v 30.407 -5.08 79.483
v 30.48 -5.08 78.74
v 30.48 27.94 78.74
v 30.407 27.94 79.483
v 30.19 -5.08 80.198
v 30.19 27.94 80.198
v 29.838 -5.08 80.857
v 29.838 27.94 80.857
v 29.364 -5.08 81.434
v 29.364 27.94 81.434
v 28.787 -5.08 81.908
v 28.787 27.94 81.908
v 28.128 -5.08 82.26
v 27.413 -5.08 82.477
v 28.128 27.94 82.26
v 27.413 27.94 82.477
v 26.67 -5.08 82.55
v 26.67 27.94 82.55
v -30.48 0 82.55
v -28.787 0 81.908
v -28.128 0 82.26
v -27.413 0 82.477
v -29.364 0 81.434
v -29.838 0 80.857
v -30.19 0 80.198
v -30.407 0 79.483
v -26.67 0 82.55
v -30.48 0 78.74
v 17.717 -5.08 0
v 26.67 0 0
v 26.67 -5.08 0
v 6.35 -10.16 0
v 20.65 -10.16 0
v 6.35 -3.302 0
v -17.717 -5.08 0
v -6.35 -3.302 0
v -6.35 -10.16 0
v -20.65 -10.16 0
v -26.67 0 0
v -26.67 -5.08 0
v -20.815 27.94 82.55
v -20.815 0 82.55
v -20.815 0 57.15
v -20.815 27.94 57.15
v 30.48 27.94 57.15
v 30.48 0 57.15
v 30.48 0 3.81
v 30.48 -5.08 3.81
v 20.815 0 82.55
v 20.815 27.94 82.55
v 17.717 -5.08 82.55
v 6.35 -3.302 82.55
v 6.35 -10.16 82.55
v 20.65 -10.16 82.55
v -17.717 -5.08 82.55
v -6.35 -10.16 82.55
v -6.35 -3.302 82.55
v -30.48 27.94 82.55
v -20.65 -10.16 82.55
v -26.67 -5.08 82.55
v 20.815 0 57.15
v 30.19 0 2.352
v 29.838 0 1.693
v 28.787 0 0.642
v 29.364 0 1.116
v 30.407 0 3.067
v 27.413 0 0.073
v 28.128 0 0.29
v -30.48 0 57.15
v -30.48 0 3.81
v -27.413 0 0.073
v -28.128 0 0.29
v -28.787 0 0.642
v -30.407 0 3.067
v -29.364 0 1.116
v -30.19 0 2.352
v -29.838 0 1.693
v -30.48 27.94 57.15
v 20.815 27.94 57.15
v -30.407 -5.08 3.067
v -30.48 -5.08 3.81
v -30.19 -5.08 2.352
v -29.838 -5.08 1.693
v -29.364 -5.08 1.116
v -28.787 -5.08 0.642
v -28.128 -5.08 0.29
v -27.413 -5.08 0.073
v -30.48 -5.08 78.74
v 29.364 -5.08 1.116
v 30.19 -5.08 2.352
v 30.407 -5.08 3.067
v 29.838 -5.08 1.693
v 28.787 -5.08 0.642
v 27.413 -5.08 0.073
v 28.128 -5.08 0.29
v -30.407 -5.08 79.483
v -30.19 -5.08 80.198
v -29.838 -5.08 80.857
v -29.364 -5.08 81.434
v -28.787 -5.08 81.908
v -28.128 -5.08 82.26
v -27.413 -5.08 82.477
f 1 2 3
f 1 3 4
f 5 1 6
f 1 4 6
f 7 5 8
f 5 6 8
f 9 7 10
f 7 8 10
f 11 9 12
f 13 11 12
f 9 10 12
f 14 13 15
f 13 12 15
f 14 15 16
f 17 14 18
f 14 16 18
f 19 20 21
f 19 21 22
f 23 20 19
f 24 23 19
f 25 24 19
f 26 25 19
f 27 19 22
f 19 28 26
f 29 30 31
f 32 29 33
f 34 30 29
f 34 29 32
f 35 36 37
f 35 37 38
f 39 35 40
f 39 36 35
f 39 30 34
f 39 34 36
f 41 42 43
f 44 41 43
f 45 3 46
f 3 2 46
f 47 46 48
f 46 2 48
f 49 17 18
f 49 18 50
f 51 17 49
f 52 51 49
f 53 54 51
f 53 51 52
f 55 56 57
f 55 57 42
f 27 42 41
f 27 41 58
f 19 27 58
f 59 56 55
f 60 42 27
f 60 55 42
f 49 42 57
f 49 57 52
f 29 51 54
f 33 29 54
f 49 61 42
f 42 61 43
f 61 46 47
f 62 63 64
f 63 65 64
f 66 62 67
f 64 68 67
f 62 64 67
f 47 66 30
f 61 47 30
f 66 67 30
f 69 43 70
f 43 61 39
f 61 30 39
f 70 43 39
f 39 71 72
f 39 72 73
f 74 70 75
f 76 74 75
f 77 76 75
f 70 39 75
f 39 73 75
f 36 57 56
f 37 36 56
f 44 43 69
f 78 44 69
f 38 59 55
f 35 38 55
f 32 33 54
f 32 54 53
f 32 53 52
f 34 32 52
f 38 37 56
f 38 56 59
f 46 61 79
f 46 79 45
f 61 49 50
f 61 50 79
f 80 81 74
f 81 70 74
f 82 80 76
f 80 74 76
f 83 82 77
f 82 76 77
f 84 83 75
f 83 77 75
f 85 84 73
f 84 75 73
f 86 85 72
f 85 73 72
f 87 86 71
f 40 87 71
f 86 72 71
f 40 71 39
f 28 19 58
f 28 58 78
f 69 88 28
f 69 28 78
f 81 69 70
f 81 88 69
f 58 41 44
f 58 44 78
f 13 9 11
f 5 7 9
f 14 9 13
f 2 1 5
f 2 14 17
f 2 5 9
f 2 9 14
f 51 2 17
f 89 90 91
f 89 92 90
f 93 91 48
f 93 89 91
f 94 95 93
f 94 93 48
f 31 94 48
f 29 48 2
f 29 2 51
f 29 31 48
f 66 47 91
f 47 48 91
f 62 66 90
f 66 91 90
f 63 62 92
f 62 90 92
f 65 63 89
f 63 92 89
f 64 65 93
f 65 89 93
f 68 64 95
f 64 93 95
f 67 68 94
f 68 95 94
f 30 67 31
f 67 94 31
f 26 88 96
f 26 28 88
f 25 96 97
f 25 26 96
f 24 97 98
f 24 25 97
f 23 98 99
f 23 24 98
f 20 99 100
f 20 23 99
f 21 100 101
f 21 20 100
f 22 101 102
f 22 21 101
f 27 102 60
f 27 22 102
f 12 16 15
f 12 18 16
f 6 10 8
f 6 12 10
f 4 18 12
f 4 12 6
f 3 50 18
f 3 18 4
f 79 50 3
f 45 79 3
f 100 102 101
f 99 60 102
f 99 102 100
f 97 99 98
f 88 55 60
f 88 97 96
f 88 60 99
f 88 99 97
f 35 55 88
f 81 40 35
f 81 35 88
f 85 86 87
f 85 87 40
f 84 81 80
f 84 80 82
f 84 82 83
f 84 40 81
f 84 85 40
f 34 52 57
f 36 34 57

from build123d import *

# Parameters (mm, degrees)
EXTRUDE1_DEPTH = 82.55
SKETCH8_W      = 9.6647
SKETCH8_H      = 25.4
EXTRUDE6_DEPTH = 27.94
FILLET1_R      = 3.81


with BuildPart() as part:
    # Sketch1 → Extrude1 (new body)
    with BuildSketch(Plane.XY):
        Polygon((0, 0), (30.48, 0), (30.48, -5.08), (17.717260633, -5.08), (20.6502, -10.16), (6.35, -10.16), (6.35, -3.302), (-6.35, -3.302), (-6.35, -10.16), (-20.6502, -10.16), (-17.717260633, -5.08), (-30.48, -5.08), (-30.48, 0), align=None)
    extrude(amount=EXTRUDE1_DEPTH)

    # Sketch8 → Extrude6 (add)
    with BuildSketch(Plane(origin=(0, 0, 0), x_dir=(1, 0, 0), z_dir=(0, 1, 0))):
        with Locations((25.64765, -69.85)):
            Rectangle(SKETCH8_W, SKETCH8_H)
    extrude6 = extrude(amount=EXTRUDE6_DEPTH)

    # Fillet1
    fillet1_edges = [part.edges().sort_by_distance(p)[0] for p in [
        (30.48, -2.54, 0),
        (-30.48, -2.54, 0),
        (30.48, 11.43, 82.55),
        (-30.48, -2.54, 82.55),
    ]]
    fillet(fillet1_edges, radius=FILLET1_R)

    # Mirror1: Extrude6 across plane
    add(extrude6.mirror(Plane(origin=(0, 0, 0), x_dir=(0, 0, 1), z_dir=(1, 0, 0))))


solid = part.part
